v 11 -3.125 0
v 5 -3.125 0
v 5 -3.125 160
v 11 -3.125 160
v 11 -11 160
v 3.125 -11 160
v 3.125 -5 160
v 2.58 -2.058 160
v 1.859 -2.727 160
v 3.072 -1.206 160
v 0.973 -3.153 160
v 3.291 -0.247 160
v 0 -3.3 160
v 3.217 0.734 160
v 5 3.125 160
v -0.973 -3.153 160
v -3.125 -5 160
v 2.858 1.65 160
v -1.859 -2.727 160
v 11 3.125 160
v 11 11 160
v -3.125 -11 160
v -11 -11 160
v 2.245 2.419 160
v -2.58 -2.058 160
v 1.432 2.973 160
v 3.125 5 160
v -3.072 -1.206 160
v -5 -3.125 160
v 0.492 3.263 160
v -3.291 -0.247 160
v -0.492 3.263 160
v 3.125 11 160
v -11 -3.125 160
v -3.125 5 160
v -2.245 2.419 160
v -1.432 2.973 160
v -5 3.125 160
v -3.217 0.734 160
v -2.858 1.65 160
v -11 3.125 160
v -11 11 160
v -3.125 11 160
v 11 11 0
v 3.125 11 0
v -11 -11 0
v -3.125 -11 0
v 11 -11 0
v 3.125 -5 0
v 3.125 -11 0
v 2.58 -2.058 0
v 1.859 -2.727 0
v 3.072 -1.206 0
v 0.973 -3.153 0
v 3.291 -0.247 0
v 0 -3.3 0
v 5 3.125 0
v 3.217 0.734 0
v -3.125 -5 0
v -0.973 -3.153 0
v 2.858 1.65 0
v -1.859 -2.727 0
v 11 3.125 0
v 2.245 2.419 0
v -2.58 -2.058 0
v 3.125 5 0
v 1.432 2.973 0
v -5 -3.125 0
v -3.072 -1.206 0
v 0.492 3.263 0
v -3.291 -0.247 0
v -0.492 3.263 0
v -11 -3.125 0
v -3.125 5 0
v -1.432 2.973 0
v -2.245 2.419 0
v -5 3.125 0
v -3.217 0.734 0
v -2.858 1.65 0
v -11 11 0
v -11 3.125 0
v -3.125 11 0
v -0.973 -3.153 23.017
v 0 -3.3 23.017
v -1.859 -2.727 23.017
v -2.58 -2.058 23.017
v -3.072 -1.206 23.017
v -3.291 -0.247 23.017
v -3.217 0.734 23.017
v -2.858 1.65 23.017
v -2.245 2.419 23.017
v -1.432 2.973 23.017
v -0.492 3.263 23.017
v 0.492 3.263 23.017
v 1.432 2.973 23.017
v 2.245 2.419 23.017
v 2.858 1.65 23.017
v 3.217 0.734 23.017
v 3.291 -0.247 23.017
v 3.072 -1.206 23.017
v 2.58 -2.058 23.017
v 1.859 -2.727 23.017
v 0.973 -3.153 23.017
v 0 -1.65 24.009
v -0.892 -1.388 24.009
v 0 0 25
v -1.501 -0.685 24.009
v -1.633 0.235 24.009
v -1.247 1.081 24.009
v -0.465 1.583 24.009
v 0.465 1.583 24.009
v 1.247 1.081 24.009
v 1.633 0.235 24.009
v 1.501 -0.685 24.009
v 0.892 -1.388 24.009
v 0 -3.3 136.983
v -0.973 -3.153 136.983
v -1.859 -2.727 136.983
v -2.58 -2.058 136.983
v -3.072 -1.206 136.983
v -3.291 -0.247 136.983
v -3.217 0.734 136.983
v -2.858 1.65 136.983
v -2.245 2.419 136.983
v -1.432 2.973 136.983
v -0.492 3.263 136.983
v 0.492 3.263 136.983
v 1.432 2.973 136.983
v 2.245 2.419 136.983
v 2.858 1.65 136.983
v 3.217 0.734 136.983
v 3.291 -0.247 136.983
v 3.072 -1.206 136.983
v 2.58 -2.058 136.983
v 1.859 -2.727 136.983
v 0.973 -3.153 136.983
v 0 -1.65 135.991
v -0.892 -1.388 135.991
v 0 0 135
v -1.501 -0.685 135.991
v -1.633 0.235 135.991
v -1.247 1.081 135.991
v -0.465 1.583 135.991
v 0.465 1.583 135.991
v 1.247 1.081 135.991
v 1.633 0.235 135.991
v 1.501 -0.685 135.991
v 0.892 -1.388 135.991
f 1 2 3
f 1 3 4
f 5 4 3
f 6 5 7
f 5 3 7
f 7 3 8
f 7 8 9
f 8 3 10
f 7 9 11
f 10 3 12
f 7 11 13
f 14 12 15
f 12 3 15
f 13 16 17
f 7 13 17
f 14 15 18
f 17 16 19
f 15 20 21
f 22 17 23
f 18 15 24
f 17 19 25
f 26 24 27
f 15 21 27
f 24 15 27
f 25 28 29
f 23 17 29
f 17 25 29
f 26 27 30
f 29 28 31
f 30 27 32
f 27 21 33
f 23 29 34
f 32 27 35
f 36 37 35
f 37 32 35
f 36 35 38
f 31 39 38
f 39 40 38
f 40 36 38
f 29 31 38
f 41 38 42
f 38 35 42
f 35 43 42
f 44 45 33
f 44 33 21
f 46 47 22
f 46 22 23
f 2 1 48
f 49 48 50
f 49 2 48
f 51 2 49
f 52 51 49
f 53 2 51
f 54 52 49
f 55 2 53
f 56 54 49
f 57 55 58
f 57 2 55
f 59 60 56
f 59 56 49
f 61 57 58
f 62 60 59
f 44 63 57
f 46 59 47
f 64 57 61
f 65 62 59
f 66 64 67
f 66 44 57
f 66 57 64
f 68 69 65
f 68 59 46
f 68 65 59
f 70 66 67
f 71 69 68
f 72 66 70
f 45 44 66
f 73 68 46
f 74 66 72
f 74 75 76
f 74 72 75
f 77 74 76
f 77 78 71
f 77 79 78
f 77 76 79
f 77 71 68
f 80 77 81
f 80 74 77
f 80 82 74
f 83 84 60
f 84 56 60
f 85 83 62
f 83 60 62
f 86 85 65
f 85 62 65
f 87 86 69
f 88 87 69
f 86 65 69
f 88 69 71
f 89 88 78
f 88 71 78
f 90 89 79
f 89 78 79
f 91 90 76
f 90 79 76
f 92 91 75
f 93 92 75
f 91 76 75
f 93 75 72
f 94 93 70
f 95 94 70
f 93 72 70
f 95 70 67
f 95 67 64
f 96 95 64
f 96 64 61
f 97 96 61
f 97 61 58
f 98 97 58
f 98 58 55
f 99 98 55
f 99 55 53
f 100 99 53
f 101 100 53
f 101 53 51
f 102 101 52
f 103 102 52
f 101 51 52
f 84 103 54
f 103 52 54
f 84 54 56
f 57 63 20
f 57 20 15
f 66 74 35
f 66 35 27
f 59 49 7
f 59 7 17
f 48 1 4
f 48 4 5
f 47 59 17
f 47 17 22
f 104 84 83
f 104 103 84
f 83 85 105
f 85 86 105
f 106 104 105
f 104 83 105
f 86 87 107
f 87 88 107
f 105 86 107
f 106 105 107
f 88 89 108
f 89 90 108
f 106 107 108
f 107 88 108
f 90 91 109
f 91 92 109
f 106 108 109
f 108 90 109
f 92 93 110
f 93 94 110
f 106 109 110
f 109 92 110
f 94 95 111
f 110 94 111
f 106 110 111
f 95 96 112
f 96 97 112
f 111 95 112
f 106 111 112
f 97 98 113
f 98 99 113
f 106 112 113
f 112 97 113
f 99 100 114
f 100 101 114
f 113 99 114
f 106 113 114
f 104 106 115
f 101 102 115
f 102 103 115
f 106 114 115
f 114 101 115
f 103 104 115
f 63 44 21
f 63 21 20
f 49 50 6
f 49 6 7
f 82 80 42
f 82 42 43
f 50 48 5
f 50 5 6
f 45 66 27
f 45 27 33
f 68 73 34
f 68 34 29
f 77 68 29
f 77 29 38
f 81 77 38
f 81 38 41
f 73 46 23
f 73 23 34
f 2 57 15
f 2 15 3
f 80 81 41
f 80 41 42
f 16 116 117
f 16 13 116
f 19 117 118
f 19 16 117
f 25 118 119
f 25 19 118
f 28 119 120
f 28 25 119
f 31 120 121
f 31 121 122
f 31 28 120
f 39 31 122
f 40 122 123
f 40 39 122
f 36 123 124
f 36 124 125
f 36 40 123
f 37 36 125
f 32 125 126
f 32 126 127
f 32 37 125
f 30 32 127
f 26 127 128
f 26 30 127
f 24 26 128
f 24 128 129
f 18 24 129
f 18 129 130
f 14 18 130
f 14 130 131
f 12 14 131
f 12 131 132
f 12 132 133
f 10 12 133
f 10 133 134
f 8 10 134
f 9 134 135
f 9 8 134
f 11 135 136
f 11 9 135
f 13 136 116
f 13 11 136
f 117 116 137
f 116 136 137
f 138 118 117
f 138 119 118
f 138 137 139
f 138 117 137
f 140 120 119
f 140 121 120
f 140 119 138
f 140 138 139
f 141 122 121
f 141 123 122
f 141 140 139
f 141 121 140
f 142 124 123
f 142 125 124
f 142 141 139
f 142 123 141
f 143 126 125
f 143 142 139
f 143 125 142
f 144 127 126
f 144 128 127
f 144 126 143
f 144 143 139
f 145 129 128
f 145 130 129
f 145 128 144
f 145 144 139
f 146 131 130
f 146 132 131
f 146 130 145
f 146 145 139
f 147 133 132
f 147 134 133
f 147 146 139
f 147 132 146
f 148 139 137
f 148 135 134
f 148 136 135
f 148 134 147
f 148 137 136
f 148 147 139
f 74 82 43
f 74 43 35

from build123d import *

# Parameters (mm, degrees)
BOSS_EXTRU_1_DEPTH = 160


with BuildPart() as part:
    # Esquisse1 → Boss.-Extru.1 (new body)
    with BuildSketch(Plane.XY):
        Polygon((3.125, 11), (11, 11), (11, 3.125), (5, 3.125), (5, -3.125), (11, -3.125), (11, -11), (3.125, -11), (3.125, -5), (-3.125, -5), (-3.125, -11), (-11, -11), (-11, -3.125), (-5, -3.125), (-5, 3.125), (-11, 3.125), (-11, 11), (-3.125, 11), (-3.125, 5), (3.125, 5), align=None)
    extrude(amount=BOSS_EXTRU_1_DEPTH)

    # Esquisse3 → Dégagement M61 (revolve, cut)
    with BuildSketch(Plane(origin=(0, 0, 160), x_dir=(0, -1, 0), z_dir=(1, 0, 0))):
        Polygon((0, 0), (0, 25), (3.3, 23.017159957), (3.3, 0), align=None)
    d_gagement_m61 = revolve(axis=Axis((0, 0, 166.35), (0, 0, -1)), mode=Mode.SUBTRACT)

    # Symétrie1: Dégagement M61 across plane
    add(d_gagement_m61.mirror(Plane.XY.offset(80)), mode=Mode.SUBTRACT)


solid = part.part
